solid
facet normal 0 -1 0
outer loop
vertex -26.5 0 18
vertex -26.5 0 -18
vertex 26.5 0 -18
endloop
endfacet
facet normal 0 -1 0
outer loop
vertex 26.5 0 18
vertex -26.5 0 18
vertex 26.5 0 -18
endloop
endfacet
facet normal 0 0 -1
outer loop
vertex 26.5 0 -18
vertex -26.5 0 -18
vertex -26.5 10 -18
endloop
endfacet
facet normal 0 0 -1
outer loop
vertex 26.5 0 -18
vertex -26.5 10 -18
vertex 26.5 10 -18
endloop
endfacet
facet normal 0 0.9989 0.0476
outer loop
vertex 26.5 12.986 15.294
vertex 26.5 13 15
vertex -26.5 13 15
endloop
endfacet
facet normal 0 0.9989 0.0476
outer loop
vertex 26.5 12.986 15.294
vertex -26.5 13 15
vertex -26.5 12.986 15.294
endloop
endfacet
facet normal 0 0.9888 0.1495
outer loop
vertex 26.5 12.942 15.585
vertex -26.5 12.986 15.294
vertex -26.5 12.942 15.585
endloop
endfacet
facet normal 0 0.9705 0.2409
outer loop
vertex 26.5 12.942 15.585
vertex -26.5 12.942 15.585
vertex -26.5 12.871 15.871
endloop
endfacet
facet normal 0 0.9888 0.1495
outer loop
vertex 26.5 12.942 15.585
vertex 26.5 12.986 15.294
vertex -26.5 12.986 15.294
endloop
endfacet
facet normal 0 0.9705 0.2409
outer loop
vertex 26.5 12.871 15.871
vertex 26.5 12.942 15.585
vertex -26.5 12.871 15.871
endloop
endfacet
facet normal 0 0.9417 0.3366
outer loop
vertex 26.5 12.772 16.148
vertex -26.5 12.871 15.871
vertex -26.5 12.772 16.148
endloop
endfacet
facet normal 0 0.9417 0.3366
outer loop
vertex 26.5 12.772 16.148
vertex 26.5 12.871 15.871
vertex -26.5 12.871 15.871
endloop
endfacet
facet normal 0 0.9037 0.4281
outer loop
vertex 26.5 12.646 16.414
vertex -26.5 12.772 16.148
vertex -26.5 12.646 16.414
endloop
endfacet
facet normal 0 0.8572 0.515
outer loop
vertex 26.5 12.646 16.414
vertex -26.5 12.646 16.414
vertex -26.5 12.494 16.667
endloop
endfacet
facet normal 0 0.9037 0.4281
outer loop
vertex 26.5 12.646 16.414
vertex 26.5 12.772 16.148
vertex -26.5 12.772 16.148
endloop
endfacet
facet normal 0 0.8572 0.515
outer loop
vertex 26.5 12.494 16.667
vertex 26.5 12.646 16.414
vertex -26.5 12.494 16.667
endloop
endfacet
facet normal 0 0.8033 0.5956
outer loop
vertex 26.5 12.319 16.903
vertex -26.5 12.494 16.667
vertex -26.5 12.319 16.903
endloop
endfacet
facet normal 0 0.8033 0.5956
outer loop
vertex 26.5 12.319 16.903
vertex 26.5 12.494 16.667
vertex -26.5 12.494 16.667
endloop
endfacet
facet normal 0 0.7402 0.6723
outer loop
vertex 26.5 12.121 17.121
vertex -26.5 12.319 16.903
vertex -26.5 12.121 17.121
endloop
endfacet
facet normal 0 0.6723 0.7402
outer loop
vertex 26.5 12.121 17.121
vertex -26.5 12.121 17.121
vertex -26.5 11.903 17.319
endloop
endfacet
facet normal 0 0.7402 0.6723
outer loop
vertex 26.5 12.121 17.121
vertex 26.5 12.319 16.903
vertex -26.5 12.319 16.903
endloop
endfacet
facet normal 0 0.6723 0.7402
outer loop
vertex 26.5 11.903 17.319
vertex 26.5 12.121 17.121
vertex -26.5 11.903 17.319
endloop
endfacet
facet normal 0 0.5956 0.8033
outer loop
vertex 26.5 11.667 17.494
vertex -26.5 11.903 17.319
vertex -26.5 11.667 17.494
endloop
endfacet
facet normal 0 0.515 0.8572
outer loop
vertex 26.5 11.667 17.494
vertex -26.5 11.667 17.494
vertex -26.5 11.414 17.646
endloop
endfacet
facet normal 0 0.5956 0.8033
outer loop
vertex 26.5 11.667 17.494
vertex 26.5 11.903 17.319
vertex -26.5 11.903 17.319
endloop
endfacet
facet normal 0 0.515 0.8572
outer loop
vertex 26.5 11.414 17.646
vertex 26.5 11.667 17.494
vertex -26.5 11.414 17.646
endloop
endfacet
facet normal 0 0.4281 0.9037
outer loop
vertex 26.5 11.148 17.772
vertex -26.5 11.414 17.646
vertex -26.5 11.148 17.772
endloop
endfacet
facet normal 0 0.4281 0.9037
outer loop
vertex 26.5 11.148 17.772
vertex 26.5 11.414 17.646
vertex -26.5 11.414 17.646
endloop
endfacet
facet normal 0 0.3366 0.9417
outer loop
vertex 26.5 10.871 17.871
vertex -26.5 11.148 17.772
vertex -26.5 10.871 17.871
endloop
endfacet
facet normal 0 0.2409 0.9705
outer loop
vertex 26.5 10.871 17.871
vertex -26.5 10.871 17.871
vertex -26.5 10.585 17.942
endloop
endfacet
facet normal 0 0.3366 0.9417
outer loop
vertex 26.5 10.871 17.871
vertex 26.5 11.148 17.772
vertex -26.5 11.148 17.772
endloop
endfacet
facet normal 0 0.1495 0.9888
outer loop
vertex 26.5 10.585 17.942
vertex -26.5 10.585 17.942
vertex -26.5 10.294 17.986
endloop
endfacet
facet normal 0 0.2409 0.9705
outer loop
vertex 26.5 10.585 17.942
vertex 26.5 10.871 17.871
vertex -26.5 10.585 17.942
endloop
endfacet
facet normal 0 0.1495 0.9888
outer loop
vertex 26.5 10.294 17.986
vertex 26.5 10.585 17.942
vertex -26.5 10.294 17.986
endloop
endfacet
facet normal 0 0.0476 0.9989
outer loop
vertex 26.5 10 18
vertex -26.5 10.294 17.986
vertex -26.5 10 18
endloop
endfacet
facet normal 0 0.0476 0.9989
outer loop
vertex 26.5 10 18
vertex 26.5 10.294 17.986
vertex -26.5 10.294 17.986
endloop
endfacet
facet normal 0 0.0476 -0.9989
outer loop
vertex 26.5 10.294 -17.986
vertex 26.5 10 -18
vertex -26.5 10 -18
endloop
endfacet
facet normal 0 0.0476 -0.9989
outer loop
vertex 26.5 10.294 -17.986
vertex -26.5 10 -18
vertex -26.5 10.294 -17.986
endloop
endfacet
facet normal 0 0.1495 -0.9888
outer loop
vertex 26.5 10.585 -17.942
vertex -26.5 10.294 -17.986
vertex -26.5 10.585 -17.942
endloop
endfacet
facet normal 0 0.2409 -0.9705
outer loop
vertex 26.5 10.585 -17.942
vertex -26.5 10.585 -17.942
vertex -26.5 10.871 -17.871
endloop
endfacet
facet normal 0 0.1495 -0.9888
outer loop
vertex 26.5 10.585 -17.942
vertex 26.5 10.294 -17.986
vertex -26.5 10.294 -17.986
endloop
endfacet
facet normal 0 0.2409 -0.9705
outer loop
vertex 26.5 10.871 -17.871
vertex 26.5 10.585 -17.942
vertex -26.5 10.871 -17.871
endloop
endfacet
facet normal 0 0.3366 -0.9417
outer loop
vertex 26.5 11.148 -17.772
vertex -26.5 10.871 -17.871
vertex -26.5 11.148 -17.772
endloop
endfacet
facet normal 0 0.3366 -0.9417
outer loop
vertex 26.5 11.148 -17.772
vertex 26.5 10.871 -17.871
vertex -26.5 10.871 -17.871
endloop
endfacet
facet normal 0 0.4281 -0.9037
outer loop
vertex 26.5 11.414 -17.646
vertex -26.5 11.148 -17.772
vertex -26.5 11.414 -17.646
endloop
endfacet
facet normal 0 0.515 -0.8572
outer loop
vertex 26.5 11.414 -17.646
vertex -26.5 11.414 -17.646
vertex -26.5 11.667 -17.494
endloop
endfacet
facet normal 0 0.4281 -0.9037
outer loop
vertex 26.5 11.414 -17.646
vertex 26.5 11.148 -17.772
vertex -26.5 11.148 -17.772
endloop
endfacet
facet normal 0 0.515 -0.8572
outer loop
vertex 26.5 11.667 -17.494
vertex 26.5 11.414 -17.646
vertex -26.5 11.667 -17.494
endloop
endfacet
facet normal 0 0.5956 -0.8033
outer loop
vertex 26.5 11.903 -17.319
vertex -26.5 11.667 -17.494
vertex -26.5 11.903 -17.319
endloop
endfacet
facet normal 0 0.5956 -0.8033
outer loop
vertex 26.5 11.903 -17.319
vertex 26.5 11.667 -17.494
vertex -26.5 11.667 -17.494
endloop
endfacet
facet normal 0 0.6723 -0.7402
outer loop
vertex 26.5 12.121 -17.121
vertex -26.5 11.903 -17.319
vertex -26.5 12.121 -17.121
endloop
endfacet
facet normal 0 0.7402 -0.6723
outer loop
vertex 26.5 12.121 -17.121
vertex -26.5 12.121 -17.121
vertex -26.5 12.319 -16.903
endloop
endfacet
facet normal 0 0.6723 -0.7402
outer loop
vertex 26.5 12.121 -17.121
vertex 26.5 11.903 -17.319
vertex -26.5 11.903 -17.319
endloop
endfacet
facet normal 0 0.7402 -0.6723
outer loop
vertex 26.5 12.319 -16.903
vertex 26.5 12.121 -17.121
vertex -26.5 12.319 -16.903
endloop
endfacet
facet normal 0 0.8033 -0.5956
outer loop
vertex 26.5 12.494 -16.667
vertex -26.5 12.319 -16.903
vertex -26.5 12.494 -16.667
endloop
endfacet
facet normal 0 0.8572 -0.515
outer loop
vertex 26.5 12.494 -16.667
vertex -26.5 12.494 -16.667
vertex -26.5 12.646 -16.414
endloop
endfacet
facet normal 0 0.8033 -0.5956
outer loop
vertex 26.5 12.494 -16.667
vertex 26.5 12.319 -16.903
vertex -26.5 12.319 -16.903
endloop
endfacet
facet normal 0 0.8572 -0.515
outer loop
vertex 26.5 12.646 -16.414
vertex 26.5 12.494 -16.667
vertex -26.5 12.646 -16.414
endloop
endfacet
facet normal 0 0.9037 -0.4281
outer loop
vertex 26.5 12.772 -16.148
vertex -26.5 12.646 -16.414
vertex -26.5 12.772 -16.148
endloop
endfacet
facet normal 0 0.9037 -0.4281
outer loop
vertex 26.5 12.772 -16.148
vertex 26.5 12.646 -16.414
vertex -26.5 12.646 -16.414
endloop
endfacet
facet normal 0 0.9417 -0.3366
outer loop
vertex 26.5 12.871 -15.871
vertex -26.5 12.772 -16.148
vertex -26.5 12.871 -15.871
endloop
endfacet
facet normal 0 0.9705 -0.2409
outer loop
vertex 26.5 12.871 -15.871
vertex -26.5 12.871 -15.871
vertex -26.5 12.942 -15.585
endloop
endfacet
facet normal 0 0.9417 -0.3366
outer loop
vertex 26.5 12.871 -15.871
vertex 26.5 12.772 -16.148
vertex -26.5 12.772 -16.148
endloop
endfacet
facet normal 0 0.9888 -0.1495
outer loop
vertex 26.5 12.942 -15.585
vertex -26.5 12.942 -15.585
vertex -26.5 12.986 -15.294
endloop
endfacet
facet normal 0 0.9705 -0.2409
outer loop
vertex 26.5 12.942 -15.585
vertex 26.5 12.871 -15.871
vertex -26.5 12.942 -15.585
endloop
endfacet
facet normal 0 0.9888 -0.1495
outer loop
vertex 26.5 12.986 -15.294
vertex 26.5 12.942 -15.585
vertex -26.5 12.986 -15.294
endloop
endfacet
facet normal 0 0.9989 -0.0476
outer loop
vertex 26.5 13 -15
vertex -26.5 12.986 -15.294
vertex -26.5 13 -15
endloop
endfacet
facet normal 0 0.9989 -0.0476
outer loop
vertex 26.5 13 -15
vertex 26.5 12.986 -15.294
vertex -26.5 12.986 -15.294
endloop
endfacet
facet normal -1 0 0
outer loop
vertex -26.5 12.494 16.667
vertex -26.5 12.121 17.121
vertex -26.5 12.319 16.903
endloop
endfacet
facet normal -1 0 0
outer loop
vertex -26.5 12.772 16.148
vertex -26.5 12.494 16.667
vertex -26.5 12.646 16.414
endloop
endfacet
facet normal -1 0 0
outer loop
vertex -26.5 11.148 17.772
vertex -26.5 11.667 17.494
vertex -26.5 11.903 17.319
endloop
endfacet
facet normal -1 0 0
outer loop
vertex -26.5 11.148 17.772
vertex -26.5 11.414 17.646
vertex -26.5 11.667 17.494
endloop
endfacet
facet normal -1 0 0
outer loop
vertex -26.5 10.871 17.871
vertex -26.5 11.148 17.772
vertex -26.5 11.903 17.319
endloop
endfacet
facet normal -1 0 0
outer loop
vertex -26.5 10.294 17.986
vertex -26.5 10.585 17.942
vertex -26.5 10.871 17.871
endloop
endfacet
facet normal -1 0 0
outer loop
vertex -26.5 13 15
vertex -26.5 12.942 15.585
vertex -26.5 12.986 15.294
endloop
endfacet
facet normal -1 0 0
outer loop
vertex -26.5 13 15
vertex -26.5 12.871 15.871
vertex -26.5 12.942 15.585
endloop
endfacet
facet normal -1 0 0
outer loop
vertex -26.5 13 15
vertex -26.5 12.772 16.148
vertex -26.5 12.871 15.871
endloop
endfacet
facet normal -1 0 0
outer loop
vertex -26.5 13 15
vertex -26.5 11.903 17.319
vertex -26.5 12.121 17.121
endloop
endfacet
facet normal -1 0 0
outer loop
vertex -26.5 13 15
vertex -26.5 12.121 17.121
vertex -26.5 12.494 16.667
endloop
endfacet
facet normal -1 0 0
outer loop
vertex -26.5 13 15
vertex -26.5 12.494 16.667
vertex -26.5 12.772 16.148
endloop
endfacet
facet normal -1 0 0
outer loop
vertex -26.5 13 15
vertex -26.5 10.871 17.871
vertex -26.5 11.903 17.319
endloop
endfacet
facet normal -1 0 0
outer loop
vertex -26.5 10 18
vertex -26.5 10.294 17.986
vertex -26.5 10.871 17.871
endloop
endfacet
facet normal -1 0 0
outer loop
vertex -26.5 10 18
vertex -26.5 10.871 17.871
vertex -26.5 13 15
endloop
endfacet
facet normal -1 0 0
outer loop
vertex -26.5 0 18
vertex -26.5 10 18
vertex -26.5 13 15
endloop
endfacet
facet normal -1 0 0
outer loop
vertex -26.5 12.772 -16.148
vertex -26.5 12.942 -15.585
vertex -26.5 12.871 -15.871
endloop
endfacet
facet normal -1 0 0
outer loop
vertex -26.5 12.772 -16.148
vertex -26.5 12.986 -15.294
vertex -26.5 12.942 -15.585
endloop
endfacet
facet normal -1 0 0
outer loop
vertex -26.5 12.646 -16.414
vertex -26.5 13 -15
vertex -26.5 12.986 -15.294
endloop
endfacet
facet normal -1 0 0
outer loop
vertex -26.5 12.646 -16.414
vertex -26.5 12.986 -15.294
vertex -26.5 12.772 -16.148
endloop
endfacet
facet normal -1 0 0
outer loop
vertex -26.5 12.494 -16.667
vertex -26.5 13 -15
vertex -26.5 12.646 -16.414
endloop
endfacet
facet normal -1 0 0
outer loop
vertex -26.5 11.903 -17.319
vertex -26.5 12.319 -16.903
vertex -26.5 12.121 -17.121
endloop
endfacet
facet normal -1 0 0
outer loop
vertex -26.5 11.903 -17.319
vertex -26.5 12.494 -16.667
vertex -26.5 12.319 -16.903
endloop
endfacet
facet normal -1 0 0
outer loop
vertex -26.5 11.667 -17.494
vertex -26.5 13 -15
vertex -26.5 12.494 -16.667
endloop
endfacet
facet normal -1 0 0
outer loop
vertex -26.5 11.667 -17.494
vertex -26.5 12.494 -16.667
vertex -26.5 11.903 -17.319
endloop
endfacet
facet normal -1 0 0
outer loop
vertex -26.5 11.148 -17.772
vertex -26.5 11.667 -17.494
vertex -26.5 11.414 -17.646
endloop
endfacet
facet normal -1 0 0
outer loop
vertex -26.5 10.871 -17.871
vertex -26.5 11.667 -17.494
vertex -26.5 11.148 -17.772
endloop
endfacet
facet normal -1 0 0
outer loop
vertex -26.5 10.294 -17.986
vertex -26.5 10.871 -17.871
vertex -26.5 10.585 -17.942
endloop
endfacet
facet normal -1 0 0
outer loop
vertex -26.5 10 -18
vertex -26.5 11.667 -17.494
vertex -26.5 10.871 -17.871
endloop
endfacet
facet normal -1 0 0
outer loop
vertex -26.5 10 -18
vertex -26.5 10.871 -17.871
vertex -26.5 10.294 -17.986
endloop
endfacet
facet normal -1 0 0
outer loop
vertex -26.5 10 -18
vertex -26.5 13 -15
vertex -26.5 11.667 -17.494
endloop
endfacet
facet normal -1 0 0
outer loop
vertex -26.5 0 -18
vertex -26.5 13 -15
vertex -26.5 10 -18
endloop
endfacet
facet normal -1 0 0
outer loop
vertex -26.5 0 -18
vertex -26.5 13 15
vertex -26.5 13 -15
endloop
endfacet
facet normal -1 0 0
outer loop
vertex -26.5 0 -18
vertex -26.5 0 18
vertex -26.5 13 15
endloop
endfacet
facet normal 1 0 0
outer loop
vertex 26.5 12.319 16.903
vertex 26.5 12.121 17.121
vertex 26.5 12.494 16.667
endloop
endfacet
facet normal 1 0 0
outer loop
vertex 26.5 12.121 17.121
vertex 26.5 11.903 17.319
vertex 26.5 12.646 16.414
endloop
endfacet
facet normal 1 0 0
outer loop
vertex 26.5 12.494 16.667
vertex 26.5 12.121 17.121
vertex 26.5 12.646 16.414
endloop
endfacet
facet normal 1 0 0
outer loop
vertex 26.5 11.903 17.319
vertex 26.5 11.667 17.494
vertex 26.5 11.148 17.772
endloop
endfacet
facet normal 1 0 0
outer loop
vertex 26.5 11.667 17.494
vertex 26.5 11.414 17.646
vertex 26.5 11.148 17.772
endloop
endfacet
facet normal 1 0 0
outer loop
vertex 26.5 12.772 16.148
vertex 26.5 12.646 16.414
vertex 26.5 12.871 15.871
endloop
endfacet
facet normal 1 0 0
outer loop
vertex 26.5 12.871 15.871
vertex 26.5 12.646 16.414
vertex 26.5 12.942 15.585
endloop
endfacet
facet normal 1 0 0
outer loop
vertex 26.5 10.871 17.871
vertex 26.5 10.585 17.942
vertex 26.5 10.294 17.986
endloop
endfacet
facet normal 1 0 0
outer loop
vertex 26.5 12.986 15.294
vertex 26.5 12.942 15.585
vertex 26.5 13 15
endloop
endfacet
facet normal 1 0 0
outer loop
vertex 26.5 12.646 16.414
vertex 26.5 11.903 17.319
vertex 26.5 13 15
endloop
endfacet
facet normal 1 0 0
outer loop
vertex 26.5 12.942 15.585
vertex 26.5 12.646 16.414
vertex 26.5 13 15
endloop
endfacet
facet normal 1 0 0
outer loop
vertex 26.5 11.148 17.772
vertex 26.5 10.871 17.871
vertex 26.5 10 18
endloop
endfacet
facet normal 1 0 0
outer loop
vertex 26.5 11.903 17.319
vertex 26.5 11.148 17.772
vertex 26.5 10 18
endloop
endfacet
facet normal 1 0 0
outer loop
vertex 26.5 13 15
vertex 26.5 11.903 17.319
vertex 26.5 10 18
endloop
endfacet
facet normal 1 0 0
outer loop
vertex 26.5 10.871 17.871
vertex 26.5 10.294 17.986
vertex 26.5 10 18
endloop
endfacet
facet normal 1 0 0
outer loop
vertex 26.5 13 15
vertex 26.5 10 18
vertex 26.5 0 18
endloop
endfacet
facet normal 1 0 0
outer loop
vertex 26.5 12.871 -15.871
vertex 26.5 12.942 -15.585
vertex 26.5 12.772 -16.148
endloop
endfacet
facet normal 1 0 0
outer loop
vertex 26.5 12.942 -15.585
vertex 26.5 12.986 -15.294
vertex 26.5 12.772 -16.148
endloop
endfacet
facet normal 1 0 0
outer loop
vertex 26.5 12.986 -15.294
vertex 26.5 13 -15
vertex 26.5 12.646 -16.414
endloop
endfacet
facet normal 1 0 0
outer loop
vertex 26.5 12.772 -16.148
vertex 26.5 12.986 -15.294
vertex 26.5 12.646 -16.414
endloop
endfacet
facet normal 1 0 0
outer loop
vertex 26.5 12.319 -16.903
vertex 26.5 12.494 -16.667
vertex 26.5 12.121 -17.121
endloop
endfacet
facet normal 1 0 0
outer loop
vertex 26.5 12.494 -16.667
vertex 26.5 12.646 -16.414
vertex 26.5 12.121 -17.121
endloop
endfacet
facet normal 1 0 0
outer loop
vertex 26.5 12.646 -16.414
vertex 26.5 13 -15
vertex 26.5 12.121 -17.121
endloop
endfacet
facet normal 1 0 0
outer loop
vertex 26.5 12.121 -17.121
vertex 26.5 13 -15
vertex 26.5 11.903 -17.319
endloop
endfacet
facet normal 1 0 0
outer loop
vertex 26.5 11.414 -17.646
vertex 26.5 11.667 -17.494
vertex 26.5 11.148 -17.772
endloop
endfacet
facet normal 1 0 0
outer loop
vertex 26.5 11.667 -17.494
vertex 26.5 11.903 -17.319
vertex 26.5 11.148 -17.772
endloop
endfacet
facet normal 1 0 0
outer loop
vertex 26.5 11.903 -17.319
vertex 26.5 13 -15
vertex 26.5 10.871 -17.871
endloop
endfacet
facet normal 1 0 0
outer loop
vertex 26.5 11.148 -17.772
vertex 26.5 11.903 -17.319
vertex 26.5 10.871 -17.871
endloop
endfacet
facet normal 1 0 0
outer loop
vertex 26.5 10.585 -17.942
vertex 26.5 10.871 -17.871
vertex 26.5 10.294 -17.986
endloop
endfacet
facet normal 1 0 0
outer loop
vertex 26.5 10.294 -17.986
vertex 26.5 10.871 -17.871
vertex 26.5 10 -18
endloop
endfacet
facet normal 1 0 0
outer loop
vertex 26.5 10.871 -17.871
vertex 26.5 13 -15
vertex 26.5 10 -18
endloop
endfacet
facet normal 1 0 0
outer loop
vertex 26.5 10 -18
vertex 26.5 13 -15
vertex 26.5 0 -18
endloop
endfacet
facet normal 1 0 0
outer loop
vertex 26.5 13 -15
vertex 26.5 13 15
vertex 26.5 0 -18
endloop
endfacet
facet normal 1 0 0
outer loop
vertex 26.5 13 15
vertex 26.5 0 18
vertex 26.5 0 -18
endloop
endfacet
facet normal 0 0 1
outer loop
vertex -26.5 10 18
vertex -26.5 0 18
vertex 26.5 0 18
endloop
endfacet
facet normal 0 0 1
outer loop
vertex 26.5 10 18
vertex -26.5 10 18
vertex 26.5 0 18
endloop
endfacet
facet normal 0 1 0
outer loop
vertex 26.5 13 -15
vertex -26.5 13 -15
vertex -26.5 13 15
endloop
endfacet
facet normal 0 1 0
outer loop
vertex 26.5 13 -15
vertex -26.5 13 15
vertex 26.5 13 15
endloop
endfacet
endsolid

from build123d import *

# Parameters (mm, degrees)
SKETCH1_W           = 53
SKETCH1_H           = 36
BOSS_EXTRUDE1_DEPTH = 13
CUT_EXTRUDE1_DEPTH  = 54


with BuildPart() as part:
    # Sketch1 → Boss-Extrude1 (new body)
    with BuildSketch(Plane(origin=(0, 0, 0), x_dir=(1, 0, 0), z_dir=(0, 1, 0))):
        Rectangle(SKETCH1_W, SKETCH1_H)
    extrude(amount=BOSS_EXTRUDE1_DEPTH)

    # Sketch2 → Cut-Extrude1 (cut, through all)
    with BuildSketch(Plane(origin=(26.5, 0, 0), x_dir=(0, 0, -1), z_dir=(1, 0, 0))):
        with BuildLine():
            Line((-18, 13), (-15, 13))
            ThreePointArc((-15, 13), (-17.121320344, 12.121320344), (-18, 10))
            Line((-18, 10), (-18, 13))
        make_face()
        with BuildLine():
            Line((15, 13), (18, 13))
            Line((18, 13), (18, 10))
            ThreePointArc((18, 10), (17.121320344, 12.121320344), (15, 13))
        make_face()
    extrude(amount=-CUT_EXTRUDE1_DEPTH, mode=Mode.SUBTRACT)


solid = part.part
